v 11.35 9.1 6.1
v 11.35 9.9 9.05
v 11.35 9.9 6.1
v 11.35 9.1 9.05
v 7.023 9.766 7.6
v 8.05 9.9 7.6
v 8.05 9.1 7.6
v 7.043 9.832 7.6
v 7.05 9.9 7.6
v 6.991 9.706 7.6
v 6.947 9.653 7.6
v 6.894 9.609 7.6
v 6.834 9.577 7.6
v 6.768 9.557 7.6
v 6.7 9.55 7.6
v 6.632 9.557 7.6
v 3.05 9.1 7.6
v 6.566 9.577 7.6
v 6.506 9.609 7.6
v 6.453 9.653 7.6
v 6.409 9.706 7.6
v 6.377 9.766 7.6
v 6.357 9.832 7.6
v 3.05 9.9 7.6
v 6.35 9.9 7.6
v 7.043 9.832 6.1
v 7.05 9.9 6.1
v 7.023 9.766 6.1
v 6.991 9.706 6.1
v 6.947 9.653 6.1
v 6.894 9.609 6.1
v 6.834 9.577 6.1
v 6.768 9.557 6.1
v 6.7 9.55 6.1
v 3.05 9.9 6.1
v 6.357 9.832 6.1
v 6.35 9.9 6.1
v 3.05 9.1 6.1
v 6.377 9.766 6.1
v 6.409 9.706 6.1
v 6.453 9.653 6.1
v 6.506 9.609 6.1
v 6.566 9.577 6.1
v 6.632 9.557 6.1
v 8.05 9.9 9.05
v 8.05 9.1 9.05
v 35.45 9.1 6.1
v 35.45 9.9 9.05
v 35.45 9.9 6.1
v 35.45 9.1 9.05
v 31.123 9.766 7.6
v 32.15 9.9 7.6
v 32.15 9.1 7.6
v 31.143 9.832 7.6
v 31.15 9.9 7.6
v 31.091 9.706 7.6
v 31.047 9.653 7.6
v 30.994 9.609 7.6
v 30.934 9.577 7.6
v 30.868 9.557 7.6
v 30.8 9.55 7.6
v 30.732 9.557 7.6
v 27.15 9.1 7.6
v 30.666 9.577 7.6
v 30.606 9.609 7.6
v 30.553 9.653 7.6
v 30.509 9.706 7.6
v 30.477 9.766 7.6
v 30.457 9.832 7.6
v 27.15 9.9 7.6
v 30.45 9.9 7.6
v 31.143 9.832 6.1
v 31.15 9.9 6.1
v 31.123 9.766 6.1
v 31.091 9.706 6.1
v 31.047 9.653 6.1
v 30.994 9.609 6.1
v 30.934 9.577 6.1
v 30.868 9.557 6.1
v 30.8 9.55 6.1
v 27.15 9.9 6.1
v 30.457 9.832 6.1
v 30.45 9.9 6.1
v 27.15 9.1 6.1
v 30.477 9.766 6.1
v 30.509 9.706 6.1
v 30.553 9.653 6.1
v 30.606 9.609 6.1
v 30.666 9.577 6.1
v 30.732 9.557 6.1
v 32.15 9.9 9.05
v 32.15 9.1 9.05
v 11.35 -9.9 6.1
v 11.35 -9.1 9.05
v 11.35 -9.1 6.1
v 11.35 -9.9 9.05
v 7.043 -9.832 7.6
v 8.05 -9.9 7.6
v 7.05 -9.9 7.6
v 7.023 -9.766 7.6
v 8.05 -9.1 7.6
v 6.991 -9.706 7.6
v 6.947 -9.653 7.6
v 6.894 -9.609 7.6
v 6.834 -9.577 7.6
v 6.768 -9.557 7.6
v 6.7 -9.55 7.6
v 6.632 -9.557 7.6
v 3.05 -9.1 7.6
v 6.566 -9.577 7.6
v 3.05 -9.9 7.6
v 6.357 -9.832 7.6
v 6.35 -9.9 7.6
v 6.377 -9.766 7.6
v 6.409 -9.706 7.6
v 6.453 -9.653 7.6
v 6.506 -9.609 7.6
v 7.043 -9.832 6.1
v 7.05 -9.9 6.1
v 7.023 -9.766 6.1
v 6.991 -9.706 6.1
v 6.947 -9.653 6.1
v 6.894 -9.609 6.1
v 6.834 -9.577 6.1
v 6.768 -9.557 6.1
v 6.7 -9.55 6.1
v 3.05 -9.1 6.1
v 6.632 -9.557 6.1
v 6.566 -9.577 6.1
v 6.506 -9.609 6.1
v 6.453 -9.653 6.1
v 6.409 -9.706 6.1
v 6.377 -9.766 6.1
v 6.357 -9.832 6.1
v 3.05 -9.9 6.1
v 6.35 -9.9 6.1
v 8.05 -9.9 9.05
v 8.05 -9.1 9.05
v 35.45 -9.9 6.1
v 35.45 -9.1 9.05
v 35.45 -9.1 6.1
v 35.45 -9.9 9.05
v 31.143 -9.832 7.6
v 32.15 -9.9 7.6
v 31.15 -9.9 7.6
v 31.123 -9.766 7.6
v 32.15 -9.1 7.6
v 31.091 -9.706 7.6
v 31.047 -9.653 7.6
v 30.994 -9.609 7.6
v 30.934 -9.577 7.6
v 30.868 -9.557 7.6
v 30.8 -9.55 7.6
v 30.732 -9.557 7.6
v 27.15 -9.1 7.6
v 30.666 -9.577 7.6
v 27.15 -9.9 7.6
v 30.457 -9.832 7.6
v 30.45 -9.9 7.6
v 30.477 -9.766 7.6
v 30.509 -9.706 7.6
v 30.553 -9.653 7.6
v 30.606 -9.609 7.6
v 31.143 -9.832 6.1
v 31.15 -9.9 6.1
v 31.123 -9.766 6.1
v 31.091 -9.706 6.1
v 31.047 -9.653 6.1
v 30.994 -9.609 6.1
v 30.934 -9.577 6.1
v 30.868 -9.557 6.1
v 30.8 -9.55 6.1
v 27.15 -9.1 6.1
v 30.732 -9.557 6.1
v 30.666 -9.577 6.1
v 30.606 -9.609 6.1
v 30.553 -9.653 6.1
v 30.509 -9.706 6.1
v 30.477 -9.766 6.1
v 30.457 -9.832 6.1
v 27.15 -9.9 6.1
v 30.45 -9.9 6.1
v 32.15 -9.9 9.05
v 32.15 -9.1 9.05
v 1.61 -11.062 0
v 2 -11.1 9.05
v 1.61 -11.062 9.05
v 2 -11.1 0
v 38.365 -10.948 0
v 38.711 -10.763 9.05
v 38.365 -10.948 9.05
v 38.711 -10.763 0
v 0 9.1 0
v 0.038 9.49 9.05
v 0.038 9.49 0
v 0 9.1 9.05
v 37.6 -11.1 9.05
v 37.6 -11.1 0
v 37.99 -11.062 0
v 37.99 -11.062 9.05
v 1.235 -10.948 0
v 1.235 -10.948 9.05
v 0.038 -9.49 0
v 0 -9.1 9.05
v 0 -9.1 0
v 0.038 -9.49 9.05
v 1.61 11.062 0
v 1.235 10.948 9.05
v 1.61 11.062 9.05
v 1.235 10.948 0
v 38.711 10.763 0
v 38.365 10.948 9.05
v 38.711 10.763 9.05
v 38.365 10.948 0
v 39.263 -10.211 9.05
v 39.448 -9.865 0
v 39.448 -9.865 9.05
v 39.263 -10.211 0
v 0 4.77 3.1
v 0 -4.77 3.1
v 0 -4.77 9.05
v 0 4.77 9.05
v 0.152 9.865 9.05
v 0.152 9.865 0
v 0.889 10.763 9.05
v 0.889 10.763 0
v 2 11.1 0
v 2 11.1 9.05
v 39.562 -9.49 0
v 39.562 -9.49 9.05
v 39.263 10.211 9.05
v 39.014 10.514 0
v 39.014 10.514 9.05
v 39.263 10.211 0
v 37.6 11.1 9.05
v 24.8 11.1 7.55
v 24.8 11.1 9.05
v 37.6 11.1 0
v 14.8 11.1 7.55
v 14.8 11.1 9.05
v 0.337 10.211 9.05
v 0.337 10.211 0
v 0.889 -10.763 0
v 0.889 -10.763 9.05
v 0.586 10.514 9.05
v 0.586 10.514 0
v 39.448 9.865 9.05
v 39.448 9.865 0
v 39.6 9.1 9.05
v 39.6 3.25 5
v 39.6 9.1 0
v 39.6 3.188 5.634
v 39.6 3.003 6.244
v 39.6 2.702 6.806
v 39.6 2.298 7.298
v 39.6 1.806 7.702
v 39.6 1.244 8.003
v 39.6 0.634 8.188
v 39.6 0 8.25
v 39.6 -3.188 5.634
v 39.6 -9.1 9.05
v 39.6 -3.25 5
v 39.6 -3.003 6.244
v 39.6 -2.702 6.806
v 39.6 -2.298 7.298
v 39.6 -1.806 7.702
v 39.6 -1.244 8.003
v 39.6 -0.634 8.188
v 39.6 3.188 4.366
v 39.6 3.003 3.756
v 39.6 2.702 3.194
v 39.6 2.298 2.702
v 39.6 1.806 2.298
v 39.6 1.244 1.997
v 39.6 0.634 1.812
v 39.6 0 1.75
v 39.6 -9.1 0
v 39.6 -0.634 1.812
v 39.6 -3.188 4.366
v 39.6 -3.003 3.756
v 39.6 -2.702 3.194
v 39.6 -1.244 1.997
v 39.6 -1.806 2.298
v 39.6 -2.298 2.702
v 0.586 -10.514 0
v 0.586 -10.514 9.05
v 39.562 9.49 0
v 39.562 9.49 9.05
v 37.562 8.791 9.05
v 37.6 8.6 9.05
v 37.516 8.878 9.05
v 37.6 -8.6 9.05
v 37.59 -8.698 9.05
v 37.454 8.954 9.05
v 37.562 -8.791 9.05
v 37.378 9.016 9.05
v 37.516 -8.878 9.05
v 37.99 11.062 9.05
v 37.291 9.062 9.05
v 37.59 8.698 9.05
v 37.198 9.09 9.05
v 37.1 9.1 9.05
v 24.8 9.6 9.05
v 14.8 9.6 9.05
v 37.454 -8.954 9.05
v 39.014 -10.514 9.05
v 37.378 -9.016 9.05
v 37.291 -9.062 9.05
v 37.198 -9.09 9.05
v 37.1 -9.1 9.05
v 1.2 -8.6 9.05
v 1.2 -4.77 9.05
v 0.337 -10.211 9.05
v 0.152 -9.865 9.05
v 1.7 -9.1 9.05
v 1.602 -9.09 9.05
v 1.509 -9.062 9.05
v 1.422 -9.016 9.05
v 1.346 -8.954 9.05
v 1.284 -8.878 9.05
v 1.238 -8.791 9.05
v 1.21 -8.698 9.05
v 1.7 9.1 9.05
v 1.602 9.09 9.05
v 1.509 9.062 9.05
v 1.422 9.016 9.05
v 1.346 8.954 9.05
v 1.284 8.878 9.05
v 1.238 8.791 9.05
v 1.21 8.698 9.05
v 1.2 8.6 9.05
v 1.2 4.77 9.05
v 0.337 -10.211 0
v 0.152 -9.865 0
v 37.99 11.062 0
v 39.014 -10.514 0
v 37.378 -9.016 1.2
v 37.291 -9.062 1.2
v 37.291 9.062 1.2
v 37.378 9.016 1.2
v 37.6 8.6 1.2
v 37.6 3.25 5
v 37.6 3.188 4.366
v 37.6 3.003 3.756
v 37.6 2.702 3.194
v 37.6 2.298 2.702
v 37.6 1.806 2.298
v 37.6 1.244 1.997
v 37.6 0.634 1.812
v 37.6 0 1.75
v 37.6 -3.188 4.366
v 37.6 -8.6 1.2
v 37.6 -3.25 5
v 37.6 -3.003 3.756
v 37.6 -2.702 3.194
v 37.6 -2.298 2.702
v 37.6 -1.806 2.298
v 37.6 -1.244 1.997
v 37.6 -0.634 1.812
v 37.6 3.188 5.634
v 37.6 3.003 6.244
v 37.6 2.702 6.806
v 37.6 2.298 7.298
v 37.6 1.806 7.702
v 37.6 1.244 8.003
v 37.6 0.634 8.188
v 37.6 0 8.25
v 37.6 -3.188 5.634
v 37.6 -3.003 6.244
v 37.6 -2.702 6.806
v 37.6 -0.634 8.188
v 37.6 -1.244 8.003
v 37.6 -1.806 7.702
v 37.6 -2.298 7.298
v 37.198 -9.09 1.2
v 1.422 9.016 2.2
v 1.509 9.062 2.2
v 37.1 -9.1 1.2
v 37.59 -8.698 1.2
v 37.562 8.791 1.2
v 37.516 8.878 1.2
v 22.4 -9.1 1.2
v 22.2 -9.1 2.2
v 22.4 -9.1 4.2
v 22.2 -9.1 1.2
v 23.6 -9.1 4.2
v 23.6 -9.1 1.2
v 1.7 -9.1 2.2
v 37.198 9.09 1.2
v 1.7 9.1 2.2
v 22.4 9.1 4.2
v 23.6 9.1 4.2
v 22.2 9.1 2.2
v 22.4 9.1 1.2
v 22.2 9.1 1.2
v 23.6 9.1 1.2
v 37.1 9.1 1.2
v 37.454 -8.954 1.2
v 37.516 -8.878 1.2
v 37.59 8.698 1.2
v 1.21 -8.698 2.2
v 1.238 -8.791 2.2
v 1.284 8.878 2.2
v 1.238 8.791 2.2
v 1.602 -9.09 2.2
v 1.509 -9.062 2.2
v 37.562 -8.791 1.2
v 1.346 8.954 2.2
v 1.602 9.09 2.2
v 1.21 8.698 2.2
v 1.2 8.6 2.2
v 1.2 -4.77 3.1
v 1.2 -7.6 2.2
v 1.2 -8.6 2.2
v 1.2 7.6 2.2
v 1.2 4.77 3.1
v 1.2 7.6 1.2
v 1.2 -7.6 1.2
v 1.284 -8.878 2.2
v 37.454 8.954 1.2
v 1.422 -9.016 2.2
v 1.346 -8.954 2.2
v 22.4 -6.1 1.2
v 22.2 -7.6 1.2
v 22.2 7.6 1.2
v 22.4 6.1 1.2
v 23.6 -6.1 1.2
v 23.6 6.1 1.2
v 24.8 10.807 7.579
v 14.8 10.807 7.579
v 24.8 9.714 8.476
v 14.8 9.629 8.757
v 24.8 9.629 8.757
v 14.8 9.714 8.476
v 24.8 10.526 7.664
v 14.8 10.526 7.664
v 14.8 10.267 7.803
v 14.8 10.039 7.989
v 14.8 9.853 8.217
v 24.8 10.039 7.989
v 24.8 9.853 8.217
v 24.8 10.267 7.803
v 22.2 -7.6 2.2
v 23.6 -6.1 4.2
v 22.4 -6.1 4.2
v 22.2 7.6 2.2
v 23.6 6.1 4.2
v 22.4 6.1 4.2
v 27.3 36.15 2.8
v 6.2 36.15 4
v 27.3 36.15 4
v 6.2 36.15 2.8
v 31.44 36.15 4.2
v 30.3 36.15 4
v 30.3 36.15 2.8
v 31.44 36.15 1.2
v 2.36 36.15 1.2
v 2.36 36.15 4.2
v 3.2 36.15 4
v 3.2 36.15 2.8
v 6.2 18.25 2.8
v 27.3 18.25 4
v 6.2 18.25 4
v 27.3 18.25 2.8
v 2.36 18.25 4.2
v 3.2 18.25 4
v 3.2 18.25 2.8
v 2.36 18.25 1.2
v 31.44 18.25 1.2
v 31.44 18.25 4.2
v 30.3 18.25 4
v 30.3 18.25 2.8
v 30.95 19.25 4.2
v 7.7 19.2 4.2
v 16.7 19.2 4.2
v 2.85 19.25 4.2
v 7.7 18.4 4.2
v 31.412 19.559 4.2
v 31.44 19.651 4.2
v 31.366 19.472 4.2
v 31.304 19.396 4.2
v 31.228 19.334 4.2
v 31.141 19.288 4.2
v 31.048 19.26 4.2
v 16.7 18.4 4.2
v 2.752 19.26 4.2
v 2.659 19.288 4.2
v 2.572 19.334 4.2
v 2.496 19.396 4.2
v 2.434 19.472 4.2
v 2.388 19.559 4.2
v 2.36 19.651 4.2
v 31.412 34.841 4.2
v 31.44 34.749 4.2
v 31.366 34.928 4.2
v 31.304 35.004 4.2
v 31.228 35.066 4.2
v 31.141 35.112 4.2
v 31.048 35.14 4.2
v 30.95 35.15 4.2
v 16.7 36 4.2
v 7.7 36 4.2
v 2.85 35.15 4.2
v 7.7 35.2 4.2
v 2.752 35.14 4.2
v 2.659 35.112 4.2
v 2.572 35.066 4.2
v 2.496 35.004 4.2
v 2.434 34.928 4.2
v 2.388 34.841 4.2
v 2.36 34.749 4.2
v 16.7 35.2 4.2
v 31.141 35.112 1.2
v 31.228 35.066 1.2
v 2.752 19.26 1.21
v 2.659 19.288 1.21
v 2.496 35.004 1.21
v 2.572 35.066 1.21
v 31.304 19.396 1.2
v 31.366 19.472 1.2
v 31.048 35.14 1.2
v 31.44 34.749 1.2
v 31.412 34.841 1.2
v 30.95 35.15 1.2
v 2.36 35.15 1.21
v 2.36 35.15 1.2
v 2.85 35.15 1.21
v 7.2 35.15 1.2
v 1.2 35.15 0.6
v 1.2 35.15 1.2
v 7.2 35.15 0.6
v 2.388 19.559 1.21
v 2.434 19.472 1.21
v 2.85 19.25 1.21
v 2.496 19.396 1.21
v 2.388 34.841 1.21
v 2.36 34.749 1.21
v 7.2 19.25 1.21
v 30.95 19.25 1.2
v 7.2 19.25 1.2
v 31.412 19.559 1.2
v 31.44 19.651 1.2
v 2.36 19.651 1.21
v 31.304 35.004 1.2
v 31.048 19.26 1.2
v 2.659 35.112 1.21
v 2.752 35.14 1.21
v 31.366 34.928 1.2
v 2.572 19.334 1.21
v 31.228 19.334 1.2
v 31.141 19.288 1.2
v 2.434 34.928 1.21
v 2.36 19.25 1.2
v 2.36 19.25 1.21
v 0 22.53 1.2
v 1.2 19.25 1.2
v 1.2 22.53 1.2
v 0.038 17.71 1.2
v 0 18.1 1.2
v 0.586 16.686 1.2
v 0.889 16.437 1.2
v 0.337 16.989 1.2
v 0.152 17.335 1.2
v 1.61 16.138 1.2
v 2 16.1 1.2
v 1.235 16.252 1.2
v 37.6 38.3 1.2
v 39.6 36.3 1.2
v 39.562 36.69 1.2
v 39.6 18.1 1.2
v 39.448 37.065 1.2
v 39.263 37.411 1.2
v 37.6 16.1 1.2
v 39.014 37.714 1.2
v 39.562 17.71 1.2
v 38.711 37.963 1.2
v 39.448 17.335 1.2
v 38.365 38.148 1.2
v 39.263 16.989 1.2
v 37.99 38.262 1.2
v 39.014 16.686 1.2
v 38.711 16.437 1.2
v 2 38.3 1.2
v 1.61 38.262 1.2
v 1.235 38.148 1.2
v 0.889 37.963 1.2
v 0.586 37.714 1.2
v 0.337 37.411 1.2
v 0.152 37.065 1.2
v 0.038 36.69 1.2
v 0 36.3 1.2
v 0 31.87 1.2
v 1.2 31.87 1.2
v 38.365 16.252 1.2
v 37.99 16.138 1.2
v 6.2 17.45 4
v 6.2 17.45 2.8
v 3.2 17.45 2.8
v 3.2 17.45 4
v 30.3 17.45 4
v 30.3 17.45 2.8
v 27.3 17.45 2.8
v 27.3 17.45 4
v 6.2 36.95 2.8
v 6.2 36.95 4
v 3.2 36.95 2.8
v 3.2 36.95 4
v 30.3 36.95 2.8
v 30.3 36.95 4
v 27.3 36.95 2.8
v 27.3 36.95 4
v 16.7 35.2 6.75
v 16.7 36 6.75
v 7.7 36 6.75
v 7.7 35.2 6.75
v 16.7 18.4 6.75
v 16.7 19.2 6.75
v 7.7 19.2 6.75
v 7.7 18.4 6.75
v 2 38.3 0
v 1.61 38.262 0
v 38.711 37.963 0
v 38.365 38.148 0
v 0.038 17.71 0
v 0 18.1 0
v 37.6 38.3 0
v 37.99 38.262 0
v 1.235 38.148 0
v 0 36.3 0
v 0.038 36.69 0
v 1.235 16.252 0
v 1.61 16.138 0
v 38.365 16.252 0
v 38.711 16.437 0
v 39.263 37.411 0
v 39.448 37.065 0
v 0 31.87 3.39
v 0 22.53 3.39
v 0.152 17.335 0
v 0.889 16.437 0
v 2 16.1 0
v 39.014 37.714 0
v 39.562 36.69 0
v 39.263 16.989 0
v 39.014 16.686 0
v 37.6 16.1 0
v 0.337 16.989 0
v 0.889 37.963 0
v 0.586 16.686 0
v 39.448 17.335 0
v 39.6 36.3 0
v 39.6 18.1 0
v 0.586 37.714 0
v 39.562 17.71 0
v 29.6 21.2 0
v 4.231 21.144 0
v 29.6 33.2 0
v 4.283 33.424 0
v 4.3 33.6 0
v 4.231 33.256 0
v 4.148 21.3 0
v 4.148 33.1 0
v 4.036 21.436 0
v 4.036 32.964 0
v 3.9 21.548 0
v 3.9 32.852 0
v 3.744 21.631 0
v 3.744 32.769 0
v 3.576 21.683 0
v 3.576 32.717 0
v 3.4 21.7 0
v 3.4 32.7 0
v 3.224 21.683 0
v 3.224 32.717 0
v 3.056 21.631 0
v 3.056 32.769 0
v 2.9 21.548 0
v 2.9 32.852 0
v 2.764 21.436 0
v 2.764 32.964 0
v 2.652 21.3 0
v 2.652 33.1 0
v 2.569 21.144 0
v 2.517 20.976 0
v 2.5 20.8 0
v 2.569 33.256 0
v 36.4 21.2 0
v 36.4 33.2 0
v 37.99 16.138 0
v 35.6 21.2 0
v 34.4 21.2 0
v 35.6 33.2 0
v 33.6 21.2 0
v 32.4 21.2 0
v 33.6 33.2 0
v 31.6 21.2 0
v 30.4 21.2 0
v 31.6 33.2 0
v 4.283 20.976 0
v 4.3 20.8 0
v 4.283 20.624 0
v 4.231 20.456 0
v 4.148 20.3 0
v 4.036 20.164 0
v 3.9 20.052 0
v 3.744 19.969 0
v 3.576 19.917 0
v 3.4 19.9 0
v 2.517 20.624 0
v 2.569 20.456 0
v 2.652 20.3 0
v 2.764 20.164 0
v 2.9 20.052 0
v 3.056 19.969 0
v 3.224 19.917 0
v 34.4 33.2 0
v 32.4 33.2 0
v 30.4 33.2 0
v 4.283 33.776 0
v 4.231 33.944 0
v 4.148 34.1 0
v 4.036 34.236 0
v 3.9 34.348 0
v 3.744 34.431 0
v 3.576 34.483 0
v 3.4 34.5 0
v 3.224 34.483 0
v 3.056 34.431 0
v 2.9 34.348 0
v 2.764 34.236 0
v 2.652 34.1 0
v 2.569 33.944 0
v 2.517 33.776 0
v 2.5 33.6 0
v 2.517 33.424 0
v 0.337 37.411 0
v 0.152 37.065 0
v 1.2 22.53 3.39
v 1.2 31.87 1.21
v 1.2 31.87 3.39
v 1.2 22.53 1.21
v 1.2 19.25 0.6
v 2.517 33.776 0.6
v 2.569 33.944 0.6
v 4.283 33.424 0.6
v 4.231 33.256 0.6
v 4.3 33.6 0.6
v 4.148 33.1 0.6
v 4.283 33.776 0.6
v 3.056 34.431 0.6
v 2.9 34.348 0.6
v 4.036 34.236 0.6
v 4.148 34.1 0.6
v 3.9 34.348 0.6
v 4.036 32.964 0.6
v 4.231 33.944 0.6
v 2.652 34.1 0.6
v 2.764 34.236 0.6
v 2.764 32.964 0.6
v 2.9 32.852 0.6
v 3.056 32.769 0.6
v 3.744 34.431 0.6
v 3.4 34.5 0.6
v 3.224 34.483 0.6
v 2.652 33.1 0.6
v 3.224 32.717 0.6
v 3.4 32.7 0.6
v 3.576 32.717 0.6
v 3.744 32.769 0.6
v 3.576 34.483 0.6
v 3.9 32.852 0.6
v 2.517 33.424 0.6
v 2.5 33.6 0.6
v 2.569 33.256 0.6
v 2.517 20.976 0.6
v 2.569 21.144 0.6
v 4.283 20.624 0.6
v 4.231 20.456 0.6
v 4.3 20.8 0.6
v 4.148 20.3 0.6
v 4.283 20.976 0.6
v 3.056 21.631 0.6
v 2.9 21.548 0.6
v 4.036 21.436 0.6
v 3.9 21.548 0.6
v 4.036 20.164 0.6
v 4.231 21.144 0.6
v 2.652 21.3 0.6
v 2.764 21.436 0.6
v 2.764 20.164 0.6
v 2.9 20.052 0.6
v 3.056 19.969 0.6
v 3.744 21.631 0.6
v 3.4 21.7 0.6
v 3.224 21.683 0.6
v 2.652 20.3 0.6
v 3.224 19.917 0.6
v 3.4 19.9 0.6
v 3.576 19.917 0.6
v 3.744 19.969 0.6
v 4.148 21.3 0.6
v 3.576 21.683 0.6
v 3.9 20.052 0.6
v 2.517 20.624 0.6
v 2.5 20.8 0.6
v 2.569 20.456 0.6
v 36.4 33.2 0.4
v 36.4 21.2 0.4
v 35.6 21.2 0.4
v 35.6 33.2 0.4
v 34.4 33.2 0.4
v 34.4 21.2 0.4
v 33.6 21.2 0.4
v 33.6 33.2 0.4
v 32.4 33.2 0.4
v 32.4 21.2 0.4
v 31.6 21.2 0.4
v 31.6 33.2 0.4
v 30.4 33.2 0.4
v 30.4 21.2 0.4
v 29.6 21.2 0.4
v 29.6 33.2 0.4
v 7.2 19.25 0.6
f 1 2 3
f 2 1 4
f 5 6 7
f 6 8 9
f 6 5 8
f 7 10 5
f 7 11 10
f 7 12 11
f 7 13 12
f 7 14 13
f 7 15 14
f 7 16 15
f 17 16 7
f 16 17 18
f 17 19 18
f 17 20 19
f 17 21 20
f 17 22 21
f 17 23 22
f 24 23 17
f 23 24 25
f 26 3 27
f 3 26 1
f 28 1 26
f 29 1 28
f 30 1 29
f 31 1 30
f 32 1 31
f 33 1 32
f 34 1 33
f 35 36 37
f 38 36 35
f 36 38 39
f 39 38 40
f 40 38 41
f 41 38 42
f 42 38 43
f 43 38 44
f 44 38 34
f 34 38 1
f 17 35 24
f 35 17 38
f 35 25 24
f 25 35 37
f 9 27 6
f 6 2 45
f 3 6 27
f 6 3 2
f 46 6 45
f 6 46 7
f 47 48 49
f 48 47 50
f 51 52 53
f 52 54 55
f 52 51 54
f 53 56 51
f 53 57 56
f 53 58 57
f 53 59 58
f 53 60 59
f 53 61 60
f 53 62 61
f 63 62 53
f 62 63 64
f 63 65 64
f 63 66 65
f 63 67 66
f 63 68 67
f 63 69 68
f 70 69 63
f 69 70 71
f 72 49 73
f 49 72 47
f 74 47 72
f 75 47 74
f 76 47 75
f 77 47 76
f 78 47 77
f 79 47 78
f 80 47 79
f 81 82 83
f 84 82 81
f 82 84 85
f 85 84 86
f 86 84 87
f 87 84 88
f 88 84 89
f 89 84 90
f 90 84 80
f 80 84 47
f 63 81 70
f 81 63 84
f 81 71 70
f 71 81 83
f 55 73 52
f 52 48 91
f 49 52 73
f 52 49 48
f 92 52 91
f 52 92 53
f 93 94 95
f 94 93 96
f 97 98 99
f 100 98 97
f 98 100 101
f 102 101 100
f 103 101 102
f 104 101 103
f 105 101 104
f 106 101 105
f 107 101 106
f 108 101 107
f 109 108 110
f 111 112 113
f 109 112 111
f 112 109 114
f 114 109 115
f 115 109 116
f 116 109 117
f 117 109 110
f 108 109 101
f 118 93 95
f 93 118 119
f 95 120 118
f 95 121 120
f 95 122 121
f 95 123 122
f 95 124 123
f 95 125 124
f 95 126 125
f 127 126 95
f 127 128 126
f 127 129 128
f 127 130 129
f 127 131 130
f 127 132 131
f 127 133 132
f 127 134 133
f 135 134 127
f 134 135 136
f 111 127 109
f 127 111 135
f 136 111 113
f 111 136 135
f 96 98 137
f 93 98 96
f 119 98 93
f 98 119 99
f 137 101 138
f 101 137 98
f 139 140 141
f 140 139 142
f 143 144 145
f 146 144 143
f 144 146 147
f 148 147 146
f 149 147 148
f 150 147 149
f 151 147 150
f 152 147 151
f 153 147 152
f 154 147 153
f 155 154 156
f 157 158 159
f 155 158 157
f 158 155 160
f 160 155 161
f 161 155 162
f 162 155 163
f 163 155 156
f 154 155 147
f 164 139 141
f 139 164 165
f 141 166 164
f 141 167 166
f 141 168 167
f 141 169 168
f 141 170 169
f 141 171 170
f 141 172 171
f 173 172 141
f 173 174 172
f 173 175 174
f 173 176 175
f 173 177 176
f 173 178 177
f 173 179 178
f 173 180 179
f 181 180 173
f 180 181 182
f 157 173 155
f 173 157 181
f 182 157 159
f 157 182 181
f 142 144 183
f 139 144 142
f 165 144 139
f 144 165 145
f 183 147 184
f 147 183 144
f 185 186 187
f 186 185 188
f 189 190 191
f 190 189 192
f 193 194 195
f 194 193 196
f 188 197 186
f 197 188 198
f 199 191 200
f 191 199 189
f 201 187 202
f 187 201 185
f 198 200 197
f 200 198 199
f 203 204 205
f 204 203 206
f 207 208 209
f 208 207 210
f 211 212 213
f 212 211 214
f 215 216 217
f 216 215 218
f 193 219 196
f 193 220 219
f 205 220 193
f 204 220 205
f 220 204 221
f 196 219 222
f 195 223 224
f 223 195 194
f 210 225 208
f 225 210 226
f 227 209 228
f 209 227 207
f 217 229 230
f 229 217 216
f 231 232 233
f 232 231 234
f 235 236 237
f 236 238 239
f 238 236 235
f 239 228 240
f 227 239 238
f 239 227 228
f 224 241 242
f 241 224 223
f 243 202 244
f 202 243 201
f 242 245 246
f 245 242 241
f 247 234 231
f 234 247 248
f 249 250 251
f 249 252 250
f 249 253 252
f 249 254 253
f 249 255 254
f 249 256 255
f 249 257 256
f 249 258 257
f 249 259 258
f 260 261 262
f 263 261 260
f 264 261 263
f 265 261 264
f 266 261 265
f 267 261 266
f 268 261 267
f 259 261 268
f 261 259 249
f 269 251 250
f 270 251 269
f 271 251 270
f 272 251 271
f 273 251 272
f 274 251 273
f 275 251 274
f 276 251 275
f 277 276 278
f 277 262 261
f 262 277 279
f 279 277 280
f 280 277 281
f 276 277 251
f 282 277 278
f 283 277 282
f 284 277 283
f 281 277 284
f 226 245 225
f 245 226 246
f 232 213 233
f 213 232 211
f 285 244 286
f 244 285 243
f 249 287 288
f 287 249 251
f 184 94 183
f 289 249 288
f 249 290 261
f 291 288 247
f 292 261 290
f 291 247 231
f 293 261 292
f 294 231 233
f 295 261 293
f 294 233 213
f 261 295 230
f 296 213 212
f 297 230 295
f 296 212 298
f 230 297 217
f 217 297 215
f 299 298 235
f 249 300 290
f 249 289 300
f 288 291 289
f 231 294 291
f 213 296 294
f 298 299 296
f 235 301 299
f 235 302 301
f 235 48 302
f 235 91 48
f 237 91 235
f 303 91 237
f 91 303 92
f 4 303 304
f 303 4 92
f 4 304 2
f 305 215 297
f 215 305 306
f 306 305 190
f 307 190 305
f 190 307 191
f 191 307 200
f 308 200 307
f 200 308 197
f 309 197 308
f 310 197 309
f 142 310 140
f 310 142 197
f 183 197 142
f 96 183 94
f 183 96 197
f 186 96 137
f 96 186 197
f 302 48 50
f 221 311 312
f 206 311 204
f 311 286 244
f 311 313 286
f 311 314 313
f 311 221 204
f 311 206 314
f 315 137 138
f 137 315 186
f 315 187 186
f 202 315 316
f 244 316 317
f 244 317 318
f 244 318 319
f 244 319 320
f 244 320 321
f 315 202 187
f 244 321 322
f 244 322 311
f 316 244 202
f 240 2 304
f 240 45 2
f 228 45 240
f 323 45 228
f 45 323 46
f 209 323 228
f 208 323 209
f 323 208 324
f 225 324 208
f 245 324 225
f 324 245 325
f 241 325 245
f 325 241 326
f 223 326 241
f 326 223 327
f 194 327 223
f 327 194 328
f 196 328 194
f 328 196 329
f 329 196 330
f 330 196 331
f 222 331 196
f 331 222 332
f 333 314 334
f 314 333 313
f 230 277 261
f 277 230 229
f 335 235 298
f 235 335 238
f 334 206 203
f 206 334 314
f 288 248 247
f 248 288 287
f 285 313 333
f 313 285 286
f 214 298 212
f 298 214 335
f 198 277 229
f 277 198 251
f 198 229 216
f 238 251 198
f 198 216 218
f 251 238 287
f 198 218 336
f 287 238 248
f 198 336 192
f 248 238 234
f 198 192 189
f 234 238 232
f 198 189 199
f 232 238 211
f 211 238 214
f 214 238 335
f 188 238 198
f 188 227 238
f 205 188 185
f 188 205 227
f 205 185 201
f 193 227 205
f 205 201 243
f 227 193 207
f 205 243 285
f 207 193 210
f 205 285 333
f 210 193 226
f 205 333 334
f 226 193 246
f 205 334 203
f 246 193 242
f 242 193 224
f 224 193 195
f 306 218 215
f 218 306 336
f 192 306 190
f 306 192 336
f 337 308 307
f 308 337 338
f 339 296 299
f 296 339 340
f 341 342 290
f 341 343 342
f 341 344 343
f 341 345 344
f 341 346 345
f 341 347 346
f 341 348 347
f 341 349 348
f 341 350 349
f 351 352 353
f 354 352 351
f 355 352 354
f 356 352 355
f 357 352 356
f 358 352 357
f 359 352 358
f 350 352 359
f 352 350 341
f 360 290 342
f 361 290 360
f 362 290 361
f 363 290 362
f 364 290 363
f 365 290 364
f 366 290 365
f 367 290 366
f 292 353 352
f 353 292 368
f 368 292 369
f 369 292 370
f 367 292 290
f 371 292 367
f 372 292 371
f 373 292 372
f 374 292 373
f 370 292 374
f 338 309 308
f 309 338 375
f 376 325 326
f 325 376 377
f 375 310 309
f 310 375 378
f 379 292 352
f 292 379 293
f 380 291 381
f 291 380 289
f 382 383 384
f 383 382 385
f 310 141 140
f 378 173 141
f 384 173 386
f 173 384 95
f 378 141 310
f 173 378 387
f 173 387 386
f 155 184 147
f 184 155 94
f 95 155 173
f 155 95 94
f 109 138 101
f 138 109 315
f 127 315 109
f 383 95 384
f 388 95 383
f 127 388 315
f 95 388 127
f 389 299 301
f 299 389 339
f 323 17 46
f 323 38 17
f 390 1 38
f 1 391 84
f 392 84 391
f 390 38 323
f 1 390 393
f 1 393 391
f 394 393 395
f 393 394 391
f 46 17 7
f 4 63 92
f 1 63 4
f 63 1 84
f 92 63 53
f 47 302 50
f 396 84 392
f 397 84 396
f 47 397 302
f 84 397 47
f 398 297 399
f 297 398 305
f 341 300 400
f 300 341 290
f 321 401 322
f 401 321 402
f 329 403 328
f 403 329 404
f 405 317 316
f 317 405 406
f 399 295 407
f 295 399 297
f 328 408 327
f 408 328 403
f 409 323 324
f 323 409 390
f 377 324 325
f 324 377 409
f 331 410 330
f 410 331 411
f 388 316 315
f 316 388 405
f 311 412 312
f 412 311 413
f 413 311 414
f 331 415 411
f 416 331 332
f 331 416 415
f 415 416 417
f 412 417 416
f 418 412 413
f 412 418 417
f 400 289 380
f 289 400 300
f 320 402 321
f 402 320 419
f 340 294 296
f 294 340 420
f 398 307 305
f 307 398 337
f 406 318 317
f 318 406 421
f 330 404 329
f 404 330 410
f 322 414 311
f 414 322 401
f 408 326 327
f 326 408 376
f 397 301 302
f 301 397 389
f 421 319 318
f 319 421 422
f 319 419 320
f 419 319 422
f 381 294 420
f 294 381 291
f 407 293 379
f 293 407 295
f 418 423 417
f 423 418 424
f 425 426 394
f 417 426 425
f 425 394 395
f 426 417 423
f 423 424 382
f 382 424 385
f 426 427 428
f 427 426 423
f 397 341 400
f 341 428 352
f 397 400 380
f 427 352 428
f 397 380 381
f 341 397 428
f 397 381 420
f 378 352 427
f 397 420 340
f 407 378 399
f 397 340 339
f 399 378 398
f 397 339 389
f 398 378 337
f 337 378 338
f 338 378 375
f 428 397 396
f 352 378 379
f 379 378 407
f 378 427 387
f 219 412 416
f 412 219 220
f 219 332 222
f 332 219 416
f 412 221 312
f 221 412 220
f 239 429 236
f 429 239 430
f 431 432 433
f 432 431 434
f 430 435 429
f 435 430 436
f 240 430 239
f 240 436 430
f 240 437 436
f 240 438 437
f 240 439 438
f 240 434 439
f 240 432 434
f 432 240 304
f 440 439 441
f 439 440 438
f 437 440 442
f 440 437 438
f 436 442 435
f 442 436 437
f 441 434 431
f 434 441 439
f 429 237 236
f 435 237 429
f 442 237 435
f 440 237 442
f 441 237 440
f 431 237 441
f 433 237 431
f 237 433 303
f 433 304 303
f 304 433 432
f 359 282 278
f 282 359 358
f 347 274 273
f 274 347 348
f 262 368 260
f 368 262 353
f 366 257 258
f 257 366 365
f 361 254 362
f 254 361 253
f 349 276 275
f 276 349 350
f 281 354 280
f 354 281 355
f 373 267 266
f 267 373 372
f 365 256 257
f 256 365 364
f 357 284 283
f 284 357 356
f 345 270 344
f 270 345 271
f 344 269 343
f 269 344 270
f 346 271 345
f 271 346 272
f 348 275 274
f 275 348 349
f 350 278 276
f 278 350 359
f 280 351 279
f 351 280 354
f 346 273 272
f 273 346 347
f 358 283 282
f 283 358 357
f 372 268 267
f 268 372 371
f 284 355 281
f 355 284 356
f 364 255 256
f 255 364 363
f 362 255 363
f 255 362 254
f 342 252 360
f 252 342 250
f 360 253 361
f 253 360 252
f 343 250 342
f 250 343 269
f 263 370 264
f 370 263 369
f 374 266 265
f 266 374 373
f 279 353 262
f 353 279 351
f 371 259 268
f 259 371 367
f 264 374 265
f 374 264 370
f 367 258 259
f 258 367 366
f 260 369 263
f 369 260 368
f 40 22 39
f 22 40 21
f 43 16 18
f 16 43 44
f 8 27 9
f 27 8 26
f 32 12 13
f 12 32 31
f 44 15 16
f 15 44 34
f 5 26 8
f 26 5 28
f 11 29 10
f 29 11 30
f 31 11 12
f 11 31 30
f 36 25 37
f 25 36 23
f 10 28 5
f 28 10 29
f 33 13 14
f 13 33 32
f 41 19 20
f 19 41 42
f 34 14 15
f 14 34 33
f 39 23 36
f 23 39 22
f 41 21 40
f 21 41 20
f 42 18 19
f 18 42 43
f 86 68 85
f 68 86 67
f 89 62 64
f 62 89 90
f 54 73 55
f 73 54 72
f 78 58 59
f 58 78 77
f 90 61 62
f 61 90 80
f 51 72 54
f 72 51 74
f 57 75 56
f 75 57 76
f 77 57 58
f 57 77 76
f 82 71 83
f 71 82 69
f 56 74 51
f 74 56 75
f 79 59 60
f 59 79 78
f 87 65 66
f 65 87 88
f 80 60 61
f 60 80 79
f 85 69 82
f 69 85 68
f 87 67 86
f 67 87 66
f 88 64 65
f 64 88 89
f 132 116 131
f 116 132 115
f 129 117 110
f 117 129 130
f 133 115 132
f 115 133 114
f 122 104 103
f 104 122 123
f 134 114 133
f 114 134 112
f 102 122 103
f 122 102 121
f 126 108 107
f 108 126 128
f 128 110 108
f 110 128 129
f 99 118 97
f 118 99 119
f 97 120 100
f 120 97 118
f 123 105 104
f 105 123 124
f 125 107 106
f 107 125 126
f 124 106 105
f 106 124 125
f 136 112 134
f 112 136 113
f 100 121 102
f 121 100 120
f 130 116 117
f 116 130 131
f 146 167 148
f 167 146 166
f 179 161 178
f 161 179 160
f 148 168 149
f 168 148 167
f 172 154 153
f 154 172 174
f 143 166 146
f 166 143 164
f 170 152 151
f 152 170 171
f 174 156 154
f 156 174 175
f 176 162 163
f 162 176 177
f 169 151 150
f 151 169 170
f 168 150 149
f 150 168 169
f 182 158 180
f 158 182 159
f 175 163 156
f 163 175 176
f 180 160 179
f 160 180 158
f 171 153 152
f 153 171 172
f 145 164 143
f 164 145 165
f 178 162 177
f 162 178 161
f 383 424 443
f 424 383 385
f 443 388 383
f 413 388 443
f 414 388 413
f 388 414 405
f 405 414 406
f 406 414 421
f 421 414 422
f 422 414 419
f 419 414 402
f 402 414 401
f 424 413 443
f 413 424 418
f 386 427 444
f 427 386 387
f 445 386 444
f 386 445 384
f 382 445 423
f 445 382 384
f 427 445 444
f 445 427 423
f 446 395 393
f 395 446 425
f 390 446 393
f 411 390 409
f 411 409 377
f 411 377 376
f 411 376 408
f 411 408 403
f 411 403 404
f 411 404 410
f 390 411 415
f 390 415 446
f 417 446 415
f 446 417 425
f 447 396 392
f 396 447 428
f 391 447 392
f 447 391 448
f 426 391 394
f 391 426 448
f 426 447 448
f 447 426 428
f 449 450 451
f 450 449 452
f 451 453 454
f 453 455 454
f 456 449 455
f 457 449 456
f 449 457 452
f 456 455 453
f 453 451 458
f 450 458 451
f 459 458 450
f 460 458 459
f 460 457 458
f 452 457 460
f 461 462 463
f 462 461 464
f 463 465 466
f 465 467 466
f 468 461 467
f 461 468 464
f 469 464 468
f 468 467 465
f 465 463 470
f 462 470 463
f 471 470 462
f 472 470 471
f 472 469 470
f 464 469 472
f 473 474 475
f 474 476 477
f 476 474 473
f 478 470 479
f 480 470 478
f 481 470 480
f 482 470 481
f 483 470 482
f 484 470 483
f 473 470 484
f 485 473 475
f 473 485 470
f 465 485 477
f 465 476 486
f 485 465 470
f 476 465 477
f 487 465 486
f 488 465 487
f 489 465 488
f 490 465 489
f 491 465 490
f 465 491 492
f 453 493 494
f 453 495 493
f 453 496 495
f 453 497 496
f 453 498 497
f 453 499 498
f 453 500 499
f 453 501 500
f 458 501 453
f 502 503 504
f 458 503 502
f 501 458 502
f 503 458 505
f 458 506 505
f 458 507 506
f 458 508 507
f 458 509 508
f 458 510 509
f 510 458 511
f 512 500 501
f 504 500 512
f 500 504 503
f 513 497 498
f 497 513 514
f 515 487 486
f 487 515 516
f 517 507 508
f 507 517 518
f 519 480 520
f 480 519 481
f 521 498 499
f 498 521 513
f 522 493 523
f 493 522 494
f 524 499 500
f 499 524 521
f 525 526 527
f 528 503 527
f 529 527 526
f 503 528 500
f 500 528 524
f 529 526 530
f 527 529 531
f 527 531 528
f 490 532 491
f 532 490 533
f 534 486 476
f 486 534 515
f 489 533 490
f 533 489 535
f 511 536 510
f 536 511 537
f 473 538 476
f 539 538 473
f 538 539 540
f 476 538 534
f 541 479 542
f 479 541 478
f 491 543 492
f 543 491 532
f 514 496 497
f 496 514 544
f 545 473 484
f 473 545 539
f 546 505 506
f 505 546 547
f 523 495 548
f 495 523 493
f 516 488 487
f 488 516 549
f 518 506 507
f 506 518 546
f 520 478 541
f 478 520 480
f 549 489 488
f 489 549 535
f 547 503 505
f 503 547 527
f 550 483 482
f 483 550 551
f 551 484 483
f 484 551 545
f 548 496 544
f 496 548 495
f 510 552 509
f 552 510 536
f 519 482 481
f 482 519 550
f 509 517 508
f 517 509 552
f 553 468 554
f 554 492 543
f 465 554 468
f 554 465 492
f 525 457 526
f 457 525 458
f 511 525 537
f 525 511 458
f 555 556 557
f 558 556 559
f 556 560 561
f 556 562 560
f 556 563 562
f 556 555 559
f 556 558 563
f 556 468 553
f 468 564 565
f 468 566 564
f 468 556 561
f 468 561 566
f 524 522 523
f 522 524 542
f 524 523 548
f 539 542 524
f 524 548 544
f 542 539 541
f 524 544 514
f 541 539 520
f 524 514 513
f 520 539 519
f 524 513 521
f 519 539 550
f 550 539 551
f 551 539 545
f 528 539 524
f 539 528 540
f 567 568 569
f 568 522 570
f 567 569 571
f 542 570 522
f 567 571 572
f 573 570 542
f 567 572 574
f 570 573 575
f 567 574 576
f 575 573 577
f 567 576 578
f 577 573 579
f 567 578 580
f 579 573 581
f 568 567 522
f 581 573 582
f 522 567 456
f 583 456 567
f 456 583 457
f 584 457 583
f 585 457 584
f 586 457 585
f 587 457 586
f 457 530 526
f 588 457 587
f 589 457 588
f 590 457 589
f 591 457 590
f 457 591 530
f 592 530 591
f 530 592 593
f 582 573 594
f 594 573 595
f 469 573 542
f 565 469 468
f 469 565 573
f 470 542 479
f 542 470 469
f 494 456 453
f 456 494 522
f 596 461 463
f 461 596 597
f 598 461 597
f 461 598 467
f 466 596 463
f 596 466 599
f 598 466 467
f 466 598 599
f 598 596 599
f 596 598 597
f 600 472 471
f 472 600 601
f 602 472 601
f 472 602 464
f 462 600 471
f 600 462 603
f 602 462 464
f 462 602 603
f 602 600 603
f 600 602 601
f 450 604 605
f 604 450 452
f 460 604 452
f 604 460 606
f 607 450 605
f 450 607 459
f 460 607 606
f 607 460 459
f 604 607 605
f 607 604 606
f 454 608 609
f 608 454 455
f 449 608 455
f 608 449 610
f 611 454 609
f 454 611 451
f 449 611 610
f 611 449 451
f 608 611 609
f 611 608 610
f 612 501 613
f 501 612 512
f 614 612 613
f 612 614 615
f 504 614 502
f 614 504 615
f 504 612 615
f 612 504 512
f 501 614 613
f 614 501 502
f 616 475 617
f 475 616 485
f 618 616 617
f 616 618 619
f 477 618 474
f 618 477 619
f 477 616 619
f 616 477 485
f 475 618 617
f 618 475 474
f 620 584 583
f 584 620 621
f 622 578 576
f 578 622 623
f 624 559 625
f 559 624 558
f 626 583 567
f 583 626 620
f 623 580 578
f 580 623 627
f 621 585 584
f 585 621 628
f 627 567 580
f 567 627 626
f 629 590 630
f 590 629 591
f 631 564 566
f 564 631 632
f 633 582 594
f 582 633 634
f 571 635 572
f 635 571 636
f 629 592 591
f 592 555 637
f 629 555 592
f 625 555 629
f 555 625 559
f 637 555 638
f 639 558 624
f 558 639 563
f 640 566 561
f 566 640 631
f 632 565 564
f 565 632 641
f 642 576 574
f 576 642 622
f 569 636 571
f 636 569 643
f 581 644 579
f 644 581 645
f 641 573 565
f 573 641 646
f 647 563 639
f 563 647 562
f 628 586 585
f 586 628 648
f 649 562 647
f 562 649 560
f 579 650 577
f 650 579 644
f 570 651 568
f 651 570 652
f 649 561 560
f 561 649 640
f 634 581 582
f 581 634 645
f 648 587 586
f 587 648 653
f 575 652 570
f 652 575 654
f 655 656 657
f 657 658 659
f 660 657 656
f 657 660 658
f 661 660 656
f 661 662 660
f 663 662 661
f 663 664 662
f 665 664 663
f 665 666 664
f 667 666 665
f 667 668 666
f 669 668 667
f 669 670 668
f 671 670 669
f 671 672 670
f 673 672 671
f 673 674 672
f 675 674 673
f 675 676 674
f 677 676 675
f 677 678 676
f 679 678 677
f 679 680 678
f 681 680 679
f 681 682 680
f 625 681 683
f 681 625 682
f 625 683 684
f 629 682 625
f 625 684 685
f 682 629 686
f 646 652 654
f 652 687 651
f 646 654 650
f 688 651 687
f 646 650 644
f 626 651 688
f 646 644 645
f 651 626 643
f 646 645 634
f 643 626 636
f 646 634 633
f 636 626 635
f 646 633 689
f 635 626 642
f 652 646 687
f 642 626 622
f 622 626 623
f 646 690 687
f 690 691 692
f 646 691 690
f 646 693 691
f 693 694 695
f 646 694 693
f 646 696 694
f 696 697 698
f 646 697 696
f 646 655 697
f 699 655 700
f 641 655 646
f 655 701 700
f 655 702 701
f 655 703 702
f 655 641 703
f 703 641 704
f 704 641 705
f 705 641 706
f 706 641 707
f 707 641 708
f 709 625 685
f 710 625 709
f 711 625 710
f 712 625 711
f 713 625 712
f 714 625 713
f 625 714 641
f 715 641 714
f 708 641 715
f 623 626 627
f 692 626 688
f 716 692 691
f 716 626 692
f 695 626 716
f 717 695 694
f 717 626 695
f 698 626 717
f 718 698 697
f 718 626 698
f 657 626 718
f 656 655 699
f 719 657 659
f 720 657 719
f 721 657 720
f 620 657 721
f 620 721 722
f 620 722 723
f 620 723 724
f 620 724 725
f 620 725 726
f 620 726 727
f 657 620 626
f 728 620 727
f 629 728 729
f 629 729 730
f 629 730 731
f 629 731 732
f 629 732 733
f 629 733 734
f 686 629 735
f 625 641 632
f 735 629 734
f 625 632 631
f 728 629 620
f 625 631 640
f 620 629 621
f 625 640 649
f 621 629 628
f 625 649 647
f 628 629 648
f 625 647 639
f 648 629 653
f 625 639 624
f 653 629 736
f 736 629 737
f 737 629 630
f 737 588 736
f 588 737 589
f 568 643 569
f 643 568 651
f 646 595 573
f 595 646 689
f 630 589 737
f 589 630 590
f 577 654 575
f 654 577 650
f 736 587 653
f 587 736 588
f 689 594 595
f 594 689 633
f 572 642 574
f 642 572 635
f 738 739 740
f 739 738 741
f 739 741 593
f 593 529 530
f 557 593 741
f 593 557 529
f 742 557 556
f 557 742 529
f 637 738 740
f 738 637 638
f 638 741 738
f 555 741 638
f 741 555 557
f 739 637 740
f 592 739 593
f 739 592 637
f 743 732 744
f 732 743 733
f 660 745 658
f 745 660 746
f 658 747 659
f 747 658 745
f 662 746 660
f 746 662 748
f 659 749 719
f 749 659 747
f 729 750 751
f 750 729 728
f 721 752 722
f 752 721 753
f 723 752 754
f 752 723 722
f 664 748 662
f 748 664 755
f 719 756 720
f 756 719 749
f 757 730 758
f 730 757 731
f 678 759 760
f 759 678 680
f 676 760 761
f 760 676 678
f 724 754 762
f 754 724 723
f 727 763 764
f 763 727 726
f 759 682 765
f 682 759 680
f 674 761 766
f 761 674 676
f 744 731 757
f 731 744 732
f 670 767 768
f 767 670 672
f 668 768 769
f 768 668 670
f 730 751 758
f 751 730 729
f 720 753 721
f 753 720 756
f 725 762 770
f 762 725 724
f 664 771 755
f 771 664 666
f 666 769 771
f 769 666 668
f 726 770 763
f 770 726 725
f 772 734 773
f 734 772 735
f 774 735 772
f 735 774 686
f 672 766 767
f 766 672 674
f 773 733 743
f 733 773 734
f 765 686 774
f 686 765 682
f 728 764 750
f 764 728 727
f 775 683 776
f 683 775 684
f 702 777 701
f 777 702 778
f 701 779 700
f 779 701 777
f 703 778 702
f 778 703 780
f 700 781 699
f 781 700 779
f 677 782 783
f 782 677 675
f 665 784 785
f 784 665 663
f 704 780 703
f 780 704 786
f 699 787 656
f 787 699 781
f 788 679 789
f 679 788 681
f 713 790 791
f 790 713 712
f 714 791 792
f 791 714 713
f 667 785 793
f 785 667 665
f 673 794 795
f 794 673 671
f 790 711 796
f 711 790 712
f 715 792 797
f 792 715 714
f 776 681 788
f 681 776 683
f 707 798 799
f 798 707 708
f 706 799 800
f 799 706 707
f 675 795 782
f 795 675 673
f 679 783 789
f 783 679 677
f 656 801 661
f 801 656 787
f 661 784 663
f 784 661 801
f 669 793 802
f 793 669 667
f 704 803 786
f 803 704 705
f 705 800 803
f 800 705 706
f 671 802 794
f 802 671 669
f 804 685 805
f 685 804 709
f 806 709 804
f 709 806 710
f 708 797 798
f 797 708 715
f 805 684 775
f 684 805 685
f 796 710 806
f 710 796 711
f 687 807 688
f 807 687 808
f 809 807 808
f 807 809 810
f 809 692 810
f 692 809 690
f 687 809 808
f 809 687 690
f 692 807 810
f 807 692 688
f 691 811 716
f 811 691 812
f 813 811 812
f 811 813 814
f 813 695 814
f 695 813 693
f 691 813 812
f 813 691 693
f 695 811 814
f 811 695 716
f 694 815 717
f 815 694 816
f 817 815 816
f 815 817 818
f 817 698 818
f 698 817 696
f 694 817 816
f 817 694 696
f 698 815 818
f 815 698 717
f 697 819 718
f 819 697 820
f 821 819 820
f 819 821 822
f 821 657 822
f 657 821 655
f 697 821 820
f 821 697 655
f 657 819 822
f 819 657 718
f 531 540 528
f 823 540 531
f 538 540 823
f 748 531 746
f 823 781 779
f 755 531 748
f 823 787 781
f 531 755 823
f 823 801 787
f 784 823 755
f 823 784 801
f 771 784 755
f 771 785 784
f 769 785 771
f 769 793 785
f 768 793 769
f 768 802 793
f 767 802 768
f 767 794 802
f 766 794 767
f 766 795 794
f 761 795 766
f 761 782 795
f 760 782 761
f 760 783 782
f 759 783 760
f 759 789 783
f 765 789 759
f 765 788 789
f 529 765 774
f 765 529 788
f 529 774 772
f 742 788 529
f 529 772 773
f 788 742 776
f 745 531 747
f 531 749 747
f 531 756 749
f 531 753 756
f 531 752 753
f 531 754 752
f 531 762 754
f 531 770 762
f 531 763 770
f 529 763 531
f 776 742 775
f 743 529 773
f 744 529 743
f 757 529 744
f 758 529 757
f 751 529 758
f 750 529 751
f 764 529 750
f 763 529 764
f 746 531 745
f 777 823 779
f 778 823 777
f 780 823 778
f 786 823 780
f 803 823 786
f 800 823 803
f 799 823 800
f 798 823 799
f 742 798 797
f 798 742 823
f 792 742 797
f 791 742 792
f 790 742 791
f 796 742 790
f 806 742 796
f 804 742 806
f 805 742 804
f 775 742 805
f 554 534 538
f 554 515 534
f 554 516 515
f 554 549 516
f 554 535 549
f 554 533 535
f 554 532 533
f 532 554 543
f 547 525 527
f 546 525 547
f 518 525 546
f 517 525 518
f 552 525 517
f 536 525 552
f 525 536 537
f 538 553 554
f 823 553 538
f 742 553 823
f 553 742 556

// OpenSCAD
// SPDX-License-Identifier: AGPL-3.0-or-later
// Board-only "slide" version of the XIAO ESP32S3 case with an RP-SMA bulkhead for an external antenna.
// Same geometry and parameters as xiao-esp32s3-case.scad: edit them there, all versions stay in step.

include <xiao-esp32s3-case.scad>
style = "slide";
antenna = false;
sma = true;
